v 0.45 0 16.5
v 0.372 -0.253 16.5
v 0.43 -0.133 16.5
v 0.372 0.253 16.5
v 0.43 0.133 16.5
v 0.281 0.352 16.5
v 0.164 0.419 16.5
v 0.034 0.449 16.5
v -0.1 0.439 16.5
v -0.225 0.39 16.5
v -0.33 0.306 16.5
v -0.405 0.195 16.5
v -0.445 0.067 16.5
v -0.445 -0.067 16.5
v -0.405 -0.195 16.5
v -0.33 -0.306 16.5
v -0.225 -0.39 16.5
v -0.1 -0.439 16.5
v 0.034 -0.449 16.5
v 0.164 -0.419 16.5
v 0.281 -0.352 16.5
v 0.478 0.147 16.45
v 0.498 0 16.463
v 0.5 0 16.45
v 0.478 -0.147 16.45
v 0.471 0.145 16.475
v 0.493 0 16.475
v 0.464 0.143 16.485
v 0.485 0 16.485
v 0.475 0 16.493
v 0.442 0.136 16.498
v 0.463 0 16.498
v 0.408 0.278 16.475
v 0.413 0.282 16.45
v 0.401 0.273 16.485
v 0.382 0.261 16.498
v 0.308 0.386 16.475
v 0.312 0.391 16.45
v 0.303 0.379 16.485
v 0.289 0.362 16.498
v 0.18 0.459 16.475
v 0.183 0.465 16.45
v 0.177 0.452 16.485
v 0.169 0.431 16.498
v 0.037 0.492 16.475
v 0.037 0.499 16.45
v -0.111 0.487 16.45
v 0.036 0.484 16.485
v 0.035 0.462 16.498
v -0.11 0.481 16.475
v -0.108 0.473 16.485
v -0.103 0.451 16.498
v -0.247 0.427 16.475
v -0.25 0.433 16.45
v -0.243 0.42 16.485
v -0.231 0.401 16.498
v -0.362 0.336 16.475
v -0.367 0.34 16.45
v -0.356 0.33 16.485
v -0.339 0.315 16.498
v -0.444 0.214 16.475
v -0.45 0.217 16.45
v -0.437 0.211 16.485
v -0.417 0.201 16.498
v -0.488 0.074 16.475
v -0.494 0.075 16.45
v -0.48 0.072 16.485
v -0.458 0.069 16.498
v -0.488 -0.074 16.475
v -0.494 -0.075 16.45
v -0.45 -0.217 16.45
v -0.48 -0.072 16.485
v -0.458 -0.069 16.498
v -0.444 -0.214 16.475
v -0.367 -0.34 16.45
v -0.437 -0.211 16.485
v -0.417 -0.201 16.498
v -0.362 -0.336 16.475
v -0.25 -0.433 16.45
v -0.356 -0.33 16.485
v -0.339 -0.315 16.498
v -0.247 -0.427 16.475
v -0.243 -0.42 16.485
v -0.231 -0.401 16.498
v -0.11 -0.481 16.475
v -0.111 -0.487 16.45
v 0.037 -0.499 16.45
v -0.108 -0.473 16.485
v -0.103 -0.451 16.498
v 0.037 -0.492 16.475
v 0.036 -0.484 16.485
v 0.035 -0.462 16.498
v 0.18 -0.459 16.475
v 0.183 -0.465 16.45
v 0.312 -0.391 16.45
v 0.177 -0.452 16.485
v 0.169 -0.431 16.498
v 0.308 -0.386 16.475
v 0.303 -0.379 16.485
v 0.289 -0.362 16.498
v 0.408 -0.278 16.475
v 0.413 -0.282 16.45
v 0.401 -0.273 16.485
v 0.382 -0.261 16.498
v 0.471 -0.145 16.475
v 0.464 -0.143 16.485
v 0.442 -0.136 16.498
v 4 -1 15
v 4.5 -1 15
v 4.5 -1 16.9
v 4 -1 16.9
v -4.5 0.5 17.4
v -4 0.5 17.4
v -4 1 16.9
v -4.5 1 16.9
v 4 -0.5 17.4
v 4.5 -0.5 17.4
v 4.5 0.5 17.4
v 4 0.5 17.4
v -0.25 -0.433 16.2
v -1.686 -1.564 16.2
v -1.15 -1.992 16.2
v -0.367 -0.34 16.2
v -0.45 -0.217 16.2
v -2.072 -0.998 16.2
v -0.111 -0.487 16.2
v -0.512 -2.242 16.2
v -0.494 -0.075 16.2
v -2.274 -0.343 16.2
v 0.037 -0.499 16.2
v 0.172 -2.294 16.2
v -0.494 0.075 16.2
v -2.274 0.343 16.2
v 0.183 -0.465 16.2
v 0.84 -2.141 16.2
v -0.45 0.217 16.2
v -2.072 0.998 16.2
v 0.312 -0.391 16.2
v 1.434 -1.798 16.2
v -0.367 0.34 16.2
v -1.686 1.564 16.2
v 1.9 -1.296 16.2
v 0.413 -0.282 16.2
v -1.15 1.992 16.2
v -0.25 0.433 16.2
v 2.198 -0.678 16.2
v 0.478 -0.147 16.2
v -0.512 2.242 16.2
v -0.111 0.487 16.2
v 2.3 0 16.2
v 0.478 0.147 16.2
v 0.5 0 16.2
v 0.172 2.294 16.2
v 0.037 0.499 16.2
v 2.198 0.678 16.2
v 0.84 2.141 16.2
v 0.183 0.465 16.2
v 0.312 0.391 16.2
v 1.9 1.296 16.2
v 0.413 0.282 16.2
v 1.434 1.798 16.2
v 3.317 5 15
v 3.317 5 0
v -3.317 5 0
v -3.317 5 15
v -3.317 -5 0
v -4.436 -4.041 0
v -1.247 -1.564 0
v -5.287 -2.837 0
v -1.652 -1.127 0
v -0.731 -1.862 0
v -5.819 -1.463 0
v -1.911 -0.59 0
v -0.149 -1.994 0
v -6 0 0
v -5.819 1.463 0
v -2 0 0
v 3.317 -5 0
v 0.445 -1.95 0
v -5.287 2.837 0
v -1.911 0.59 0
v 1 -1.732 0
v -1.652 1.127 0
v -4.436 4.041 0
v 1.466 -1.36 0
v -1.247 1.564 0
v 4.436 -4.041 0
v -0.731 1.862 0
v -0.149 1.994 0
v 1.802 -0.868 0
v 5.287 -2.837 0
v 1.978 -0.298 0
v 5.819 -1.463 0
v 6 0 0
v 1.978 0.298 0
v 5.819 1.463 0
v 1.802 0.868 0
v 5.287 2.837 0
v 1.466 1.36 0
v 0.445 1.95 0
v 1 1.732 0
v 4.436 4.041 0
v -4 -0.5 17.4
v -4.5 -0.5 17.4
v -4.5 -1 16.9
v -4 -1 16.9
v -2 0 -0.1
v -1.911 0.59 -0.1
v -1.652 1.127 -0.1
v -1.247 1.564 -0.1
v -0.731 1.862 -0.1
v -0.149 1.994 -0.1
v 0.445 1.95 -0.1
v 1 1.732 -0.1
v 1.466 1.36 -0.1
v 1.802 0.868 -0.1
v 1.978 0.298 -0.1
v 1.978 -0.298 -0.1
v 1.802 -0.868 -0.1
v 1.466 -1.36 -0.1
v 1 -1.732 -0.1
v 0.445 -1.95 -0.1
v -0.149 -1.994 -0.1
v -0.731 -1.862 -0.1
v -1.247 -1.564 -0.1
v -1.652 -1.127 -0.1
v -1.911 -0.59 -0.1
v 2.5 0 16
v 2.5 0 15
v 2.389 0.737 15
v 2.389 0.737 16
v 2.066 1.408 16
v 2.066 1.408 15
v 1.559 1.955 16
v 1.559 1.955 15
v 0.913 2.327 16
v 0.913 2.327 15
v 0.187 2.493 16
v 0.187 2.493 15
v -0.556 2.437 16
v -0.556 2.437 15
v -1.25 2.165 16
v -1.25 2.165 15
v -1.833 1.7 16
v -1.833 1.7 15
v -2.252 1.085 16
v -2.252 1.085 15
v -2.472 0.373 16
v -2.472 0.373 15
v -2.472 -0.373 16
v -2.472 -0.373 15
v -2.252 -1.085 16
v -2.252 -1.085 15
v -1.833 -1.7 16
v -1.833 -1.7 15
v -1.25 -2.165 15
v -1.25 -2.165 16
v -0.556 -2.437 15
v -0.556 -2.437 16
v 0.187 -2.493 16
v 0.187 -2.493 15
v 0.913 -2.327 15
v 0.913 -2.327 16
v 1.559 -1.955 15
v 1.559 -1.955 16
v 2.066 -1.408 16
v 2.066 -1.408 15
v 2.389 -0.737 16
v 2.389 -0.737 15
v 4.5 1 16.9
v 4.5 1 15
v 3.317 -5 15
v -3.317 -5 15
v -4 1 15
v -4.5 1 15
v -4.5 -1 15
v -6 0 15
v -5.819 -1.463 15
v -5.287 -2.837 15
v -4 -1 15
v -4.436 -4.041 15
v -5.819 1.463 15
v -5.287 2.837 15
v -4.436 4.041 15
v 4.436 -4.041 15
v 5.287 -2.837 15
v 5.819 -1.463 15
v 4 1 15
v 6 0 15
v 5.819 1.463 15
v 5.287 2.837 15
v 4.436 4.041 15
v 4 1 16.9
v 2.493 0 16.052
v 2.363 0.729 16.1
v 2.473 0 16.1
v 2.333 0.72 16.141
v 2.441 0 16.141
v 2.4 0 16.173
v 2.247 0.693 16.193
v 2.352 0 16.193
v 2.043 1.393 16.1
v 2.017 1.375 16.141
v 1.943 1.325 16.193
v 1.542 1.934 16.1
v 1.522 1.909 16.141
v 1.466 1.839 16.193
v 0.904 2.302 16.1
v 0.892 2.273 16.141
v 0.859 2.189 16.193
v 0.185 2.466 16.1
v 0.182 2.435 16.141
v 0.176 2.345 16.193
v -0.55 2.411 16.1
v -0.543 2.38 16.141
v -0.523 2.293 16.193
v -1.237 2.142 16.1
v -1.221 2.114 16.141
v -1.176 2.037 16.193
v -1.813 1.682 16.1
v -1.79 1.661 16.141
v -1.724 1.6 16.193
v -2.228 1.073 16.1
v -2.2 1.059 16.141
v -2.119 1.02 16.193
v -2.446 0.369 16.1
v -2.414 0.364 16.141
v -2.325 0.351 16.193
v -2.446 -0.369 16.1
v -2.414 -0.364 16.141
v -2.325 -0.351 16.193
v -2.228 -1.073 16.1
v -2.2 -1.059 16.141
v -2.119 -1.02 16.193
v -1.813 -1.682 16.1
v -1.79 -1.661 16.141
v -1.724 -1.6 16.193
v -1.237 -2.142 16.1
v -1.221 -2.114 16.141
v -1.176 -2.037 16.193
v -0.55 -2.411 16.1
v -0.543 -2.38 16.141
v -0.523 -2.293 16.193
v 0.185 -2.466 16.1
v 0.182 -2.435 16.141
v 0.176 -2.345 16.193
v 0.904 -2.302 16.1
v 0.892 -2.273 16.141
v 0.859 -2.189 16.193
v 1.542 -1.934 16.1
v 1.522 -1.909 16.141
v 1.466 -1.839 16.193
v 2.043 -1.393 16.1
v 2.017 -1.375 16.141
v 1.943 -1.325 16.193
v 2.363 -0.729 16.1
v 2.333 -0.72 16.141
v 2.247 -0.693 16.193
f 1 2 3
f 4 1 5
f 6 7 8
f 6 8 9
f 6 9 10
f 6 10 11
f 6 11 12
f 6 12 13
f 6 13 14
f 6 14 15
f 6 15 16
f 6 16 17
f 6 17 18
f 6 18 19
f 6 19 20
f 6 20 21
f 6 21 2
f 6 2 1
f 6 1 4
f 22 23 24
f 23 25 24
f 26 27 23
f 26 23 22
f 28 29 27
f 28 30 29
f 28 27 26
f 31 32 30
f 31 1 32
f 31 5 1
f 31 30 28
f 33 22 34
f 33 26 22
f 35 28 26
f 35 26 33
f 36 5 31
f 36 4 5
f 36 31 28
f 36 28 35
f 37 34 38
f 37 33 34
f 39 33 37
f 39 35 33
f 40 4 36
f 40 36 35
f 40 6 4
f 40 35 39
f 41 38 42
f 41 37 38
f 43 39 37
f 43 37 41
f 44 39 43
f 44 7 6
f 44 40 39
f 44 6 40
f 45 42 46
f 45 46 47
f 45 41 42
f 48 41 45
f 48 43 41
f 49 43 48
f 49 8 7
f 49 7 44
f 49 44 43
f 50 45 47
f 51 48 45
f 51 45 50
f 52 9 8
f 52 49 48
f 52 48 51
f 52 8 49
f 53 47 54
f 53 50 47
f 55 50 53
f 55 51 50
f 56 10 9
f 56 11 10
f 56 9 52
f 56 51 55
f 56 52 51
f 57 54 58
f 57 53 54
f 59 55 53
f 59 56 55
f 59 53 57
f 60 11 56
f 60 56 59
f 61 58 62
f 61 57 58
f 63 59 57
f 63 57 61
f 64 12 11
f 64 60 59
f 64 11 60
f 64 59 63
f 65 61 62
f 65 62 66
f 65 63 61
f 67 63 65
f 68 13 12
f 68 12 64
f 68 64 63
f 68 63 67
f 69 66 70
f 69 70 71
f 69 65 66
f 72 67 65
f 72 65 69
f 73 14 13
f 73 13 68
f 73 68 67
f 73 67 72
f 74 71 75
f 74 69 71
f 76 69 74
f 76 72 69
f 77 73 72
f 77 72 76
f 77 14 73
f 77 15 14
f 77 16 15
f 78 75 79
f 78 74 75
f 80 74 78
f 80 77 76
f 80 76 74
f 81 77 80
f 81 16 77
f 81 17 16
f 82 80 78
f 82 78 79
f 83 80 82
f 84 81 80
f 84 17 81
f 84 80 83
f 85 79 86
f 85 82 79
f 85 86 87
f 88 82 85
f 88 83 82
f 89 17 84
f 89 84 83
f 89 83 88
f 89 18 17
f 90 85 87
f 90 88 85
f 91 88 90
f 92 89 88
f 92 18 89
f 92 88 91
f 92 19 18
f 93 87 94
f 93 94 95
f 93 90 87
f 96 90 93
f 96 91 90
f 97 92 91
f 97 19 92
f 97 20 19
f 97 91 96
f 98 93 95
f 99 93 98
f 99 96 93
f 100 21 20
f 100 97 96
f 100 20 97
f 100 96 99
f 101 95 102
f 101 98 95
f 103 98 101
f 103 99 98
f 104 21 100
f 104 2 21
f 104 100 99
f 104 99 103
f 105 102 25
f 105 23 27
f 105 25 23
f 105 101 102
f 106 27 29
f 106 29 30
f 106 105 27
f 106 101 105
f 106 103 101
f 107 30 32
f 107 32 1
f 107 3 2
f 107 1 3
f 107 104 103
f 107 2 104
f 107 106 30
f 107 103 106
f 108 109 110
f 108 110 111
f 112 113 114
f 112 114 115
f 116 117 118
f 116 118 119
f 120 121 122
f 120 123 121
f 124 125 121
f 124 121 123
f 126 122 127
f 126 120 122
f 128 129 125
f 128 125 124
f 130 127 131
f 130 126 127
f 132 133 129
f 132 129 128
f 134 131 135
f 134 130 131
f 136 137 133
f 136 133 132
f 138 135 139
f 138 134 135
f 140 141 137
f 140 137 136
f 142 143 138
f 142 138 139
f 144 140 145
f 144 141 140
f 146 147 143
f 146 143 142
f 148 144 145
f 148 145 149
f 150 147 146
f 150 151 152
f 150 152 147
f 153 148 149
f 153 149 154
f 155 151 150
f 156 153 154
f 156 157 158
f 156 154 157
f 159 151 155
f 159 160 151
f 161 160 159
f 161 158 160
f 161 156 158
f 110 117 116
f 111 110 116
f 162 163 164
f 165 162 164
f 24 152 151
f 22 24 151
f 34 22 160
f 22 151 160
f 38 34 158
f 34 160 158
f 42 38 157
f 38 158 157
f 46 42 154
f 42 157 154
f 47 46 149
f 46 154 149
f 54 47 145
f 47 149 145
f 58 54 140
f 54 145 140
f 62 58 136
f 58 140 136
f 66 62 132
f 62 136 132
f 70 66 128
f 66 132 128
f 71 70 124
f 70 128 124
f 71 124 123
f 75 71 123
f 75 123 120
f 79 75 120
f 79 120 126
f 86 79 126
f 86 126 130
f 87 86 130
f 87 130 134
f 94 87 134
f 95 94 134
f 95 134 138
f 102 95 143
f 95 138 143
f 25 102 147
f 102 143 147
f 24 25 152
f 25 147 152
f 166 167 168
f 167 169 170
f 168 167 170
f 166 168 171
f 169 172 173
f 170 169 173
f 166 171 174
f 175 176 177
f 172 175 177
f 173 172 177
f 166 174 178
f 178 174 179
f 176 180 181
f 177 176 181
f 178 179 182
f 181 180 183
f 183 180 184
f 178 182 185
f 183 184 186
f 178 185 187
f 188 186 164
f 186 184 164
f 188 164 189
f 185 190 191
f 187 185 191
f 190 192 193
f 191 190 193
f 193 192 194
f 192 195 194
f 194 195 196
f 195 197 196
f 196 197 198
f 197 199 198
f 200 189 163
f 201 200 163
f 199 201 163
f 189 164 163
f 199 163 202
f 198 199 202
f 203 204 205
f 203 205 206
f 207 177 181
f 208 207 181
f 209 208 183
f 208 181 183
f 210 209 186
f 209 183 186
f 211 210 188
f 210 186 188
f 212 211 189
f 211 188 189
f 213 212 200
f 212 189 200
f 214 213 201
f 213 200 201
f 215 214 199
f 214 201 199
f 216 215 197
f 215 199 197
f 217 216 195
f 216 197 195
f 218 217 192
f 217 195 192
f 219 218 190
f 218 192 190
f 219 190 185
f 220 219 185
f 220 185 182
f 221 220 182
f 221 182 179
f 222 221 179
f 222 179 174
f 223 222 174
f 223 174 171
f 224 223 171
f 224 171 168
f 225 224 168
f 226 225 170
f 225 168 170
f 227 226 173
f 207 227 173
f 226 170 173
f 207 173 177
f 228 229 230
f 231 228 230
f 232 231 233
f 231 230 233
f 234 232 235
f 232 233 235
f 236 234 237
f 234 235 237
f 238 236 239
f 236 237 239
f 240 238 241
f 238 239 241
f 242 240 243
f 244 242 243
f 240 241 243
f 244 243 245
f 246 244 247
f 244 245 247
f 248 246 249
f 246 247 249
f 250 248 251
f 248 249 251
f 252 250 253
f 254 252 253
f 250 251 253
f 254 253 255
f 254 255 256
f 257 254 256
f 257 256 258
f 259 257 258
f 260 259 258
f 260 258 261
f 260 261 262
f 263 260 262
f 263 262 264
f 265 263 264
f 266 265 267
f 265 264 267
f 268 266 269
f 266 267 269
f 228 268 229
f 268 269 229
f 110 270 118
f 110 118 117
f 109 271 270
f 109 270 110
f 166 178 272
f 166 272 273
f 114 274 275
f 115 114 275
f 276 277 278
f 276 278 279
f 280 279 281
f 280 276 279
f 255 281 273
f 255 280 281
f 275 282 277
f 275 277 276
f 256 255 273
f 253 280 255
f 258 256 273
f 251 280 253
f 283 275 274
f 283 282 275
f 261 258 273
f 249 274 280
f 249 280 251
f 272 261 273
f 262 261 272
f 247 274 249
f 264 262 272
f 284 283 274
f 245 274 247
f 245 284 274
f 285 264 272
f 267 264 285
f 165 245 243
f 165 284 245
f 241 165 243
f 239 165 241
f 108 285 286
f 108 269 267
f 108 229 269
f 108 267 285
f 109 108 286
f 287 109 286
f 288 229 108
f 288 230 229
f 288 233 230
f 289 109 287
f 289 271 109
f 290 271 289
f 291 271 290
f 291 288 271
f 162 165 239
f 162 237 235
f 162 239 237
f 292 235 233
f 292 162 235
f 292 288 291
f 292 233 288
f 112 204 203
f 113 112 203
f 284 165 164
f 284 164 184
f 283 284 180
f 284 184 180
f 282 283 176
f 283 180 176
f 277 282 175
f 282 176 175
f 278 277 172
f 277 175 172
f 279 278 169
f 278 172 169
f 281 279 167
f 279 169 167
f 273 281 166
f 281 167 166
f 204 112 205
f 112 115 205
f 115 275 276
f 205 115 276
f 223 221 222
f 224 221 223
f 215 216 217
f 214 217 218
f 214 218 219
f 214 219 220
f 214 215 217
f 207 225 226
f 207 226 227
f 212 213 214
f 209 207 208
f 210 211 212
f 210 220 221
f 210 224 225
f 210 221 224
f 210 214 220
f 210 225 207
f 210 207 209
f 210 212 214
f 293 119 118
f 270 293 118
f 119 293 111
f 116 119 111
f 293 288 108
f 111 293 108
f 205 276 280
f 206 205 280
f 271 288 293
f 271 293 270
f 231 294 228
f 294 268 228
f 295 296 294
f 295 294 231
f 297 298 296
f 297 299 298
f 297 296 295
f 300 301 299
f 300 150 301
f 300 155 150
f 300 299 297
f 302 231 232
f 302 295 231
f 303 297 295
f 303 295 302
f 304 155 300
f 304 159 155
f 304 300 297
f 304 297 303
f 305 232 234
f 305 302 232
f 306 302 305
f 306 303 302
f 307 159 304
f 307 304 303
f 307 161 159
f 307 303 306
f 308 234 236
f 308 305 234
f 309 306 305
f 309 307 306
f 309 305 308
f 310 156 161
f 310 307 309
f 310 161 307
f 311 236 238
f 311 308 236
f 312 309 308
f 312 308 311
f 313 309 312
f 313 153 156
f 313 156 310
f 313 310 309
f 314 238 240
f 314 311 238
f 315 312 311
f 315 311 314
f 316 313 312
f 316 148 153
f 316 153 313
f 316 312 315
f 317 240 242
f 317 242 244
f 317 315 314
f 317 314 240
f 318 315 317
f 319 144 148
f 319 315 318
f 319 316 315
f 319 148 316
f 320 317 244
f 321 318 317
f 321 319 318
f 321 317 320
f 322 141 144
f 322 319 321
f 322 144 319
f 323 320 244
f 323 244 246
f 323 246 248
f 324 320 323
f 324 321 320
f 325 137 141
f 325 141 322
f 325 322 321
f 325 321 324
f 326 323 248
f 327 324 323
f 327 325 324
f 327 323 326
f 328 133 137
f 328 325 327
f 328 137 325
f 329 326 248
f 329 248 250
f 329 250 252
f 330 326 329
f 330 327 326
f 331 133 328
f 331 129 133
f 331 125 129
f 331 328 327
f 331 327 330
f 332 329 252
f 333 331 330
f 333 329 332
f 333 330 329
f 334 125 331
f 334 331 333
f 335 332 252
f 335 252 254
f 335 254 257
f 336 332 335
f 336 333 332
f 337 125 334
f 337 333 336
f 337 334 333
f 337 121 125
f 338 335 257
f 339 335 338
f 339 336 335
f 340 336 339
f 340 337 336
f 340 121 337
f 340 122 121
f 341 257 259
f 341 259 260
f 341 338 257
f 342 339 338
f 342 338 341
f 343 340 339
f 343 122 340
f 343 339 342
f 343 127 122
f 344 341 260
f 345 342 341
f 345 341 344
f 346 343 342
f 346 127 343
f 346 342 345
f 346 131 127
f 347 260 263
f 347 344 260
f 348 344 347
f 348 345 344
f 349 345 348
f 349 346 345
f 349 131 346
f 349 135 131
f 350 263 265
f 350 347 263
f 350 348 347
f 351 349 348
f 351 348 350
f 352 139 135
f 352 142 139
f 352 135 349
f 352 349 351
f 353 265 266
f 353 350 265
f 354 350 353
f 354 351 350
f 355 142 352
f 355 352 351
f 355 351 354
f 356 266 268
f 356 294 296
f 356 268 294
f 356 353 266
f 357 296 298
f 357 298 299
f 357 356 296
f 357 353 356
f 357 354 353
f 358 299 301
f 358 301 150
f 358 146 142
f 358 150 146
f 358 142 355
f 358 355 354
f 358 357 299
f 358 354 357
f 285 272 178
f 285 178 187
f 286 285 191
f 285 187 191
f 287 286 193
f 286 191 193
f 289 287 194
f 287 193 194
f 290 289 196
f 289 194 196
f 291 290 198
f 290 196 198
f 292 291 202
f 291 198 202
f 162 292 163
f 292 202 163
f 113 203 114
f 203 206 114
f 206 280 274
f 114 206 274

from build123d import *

# Parameters (mm, degrees)
SKETCH_1_R          = 6
EXTRUDE_1_DEPTH     = 15
CUT_EXTRUDE_1_DEPTH = 15
SKETCH_7_R          = 2.5
EXTRUDE_2_DEPTH     = 1.2
FILLET_1_R          = 0.2
SKETCH_8_R          = 0.5
EXTRUDE_3_DEPTH     = 0.3
FILLET_2_R          = 0.05
EXTRUDE_4_DEPTH     = 2.4
CHAMFER_1_SIZE      = 0.5
CHAMFER_2_SIZE      = 0.5
CHAMFER_3_SIZE      = 0.5
SKETCH_10_R         = 2
EXTRUDE_5_DEPTH     = 0.1


with BuildPart() as part:
    # 草图1 → 凸台-拉伸1 (new body)
    with BuildSketch(Plane.XY):
        Circle(SKETCH_1_R)
    extrude(amount=EXTRUDE_1_DEPTH)

    # 草图6 → 切除-拉伸1 (cut)
    with BuildSketch(Plane(origin=(0, 0, 0), x_dir=(-1, 0, 0), z_dir=(0, 0, -1))):
        with BuildLine():
            Line((-3.31662479, 5), (3.31662479, 5))
            ThreePointArc((3.31662479, 5), (0, 6), (-3.31662479, 5))
        make_face()
        with BuildLine():
            Line((-3.31662479, -5), (3.31662479, -5))
            ThreePointArc((3.31662479, -5), (0, -6), (-3.31662479, -5))
        make_face()
    extrude(amount=-CUT_EXTRUDE_1_DEPTH, mode=Mode.SUBTRACT)

    # 草图7 → 凸台-拉伸2 (add)
    with BuildSketch(Plane.XY.offset(15)):
        Circle(SKETCH_7_R)
    extrude(amount=EXTRUDE_2_DEPTH)

    # 圆角1
    fillet_1_edges = [part.edges().sort_by_distance(p)[0] for p in [
        (-2.5, 0, 16.2),
    ]]
    fillet(fillet_1_edges, radius=FILLET_1_R)

    # 草图8 → 凸台-拉伸3 (add)
    with BuildSketch(Plane.XY.offset(16.2)):
        Circle(SKETCH_8_R)
    extrude(amount=EXTRUDE_3_DEPTH)

    # 圆角2
    fillet_2_edges = [part.edges().sort_by_distance(p)[0] for p in [
        (-0.5, 0, 16.5),
    ]]
    fillet(fillet_2_edges, radius=FILLET_2_R)

    # 草图9 → 凸台-拉伸4 (add)
    with BuildSketch(Plane.XY.offset(15)):
        Polygon((4, 0), (4, 1), (4.5, 1), (4.5, -1), (4, -1), align=None)
        Polygon((-4, -1), (-4, 0), (-4, 1), (-4.5, 1), (-4.5, -1), align=None)
    extrude(amount=EXTRUDE_4_DEPTH)

    # 倒角1
    chamfer_1_edges = [part.edges().sort_by_distance(p)[0] for p in [
        (-4.25, 1, 17.4),
    ]]
    chamfer(chamfer_1_edges, length=CHAMFER_1_SIZE)

    # 倒角2
    chamfer_2_edges = [part.edges().sort_by_distance(p)[0] for p in [
        (-4.25, -1, 17.4),
    ]]
    chamfer(chamfer_2_edges, length=CHAMFER_2_SIZE)

    # 倒角3
    chamfer_3_edges = [part.edges().sort_by_distance(p)[0] for p in [
        (4.25, -1, 17.4),
        (4.25, 1, 17.4),
    ]]
    chamfer(chamfer_3_edges, length=CHAMFER_3_SIZE)

    # 草图10 → 凸台-拉伸5 (add)
    with BuildSketch(Plane(origin=(0, 0, 0), x_dir=(-1, 0, 0), z_dir=(0, 0, -1))):
        Circle(SKETCH_10_R)
    extrude(amount=EXTRUDE_5_DEPTH)


solid = part.part
